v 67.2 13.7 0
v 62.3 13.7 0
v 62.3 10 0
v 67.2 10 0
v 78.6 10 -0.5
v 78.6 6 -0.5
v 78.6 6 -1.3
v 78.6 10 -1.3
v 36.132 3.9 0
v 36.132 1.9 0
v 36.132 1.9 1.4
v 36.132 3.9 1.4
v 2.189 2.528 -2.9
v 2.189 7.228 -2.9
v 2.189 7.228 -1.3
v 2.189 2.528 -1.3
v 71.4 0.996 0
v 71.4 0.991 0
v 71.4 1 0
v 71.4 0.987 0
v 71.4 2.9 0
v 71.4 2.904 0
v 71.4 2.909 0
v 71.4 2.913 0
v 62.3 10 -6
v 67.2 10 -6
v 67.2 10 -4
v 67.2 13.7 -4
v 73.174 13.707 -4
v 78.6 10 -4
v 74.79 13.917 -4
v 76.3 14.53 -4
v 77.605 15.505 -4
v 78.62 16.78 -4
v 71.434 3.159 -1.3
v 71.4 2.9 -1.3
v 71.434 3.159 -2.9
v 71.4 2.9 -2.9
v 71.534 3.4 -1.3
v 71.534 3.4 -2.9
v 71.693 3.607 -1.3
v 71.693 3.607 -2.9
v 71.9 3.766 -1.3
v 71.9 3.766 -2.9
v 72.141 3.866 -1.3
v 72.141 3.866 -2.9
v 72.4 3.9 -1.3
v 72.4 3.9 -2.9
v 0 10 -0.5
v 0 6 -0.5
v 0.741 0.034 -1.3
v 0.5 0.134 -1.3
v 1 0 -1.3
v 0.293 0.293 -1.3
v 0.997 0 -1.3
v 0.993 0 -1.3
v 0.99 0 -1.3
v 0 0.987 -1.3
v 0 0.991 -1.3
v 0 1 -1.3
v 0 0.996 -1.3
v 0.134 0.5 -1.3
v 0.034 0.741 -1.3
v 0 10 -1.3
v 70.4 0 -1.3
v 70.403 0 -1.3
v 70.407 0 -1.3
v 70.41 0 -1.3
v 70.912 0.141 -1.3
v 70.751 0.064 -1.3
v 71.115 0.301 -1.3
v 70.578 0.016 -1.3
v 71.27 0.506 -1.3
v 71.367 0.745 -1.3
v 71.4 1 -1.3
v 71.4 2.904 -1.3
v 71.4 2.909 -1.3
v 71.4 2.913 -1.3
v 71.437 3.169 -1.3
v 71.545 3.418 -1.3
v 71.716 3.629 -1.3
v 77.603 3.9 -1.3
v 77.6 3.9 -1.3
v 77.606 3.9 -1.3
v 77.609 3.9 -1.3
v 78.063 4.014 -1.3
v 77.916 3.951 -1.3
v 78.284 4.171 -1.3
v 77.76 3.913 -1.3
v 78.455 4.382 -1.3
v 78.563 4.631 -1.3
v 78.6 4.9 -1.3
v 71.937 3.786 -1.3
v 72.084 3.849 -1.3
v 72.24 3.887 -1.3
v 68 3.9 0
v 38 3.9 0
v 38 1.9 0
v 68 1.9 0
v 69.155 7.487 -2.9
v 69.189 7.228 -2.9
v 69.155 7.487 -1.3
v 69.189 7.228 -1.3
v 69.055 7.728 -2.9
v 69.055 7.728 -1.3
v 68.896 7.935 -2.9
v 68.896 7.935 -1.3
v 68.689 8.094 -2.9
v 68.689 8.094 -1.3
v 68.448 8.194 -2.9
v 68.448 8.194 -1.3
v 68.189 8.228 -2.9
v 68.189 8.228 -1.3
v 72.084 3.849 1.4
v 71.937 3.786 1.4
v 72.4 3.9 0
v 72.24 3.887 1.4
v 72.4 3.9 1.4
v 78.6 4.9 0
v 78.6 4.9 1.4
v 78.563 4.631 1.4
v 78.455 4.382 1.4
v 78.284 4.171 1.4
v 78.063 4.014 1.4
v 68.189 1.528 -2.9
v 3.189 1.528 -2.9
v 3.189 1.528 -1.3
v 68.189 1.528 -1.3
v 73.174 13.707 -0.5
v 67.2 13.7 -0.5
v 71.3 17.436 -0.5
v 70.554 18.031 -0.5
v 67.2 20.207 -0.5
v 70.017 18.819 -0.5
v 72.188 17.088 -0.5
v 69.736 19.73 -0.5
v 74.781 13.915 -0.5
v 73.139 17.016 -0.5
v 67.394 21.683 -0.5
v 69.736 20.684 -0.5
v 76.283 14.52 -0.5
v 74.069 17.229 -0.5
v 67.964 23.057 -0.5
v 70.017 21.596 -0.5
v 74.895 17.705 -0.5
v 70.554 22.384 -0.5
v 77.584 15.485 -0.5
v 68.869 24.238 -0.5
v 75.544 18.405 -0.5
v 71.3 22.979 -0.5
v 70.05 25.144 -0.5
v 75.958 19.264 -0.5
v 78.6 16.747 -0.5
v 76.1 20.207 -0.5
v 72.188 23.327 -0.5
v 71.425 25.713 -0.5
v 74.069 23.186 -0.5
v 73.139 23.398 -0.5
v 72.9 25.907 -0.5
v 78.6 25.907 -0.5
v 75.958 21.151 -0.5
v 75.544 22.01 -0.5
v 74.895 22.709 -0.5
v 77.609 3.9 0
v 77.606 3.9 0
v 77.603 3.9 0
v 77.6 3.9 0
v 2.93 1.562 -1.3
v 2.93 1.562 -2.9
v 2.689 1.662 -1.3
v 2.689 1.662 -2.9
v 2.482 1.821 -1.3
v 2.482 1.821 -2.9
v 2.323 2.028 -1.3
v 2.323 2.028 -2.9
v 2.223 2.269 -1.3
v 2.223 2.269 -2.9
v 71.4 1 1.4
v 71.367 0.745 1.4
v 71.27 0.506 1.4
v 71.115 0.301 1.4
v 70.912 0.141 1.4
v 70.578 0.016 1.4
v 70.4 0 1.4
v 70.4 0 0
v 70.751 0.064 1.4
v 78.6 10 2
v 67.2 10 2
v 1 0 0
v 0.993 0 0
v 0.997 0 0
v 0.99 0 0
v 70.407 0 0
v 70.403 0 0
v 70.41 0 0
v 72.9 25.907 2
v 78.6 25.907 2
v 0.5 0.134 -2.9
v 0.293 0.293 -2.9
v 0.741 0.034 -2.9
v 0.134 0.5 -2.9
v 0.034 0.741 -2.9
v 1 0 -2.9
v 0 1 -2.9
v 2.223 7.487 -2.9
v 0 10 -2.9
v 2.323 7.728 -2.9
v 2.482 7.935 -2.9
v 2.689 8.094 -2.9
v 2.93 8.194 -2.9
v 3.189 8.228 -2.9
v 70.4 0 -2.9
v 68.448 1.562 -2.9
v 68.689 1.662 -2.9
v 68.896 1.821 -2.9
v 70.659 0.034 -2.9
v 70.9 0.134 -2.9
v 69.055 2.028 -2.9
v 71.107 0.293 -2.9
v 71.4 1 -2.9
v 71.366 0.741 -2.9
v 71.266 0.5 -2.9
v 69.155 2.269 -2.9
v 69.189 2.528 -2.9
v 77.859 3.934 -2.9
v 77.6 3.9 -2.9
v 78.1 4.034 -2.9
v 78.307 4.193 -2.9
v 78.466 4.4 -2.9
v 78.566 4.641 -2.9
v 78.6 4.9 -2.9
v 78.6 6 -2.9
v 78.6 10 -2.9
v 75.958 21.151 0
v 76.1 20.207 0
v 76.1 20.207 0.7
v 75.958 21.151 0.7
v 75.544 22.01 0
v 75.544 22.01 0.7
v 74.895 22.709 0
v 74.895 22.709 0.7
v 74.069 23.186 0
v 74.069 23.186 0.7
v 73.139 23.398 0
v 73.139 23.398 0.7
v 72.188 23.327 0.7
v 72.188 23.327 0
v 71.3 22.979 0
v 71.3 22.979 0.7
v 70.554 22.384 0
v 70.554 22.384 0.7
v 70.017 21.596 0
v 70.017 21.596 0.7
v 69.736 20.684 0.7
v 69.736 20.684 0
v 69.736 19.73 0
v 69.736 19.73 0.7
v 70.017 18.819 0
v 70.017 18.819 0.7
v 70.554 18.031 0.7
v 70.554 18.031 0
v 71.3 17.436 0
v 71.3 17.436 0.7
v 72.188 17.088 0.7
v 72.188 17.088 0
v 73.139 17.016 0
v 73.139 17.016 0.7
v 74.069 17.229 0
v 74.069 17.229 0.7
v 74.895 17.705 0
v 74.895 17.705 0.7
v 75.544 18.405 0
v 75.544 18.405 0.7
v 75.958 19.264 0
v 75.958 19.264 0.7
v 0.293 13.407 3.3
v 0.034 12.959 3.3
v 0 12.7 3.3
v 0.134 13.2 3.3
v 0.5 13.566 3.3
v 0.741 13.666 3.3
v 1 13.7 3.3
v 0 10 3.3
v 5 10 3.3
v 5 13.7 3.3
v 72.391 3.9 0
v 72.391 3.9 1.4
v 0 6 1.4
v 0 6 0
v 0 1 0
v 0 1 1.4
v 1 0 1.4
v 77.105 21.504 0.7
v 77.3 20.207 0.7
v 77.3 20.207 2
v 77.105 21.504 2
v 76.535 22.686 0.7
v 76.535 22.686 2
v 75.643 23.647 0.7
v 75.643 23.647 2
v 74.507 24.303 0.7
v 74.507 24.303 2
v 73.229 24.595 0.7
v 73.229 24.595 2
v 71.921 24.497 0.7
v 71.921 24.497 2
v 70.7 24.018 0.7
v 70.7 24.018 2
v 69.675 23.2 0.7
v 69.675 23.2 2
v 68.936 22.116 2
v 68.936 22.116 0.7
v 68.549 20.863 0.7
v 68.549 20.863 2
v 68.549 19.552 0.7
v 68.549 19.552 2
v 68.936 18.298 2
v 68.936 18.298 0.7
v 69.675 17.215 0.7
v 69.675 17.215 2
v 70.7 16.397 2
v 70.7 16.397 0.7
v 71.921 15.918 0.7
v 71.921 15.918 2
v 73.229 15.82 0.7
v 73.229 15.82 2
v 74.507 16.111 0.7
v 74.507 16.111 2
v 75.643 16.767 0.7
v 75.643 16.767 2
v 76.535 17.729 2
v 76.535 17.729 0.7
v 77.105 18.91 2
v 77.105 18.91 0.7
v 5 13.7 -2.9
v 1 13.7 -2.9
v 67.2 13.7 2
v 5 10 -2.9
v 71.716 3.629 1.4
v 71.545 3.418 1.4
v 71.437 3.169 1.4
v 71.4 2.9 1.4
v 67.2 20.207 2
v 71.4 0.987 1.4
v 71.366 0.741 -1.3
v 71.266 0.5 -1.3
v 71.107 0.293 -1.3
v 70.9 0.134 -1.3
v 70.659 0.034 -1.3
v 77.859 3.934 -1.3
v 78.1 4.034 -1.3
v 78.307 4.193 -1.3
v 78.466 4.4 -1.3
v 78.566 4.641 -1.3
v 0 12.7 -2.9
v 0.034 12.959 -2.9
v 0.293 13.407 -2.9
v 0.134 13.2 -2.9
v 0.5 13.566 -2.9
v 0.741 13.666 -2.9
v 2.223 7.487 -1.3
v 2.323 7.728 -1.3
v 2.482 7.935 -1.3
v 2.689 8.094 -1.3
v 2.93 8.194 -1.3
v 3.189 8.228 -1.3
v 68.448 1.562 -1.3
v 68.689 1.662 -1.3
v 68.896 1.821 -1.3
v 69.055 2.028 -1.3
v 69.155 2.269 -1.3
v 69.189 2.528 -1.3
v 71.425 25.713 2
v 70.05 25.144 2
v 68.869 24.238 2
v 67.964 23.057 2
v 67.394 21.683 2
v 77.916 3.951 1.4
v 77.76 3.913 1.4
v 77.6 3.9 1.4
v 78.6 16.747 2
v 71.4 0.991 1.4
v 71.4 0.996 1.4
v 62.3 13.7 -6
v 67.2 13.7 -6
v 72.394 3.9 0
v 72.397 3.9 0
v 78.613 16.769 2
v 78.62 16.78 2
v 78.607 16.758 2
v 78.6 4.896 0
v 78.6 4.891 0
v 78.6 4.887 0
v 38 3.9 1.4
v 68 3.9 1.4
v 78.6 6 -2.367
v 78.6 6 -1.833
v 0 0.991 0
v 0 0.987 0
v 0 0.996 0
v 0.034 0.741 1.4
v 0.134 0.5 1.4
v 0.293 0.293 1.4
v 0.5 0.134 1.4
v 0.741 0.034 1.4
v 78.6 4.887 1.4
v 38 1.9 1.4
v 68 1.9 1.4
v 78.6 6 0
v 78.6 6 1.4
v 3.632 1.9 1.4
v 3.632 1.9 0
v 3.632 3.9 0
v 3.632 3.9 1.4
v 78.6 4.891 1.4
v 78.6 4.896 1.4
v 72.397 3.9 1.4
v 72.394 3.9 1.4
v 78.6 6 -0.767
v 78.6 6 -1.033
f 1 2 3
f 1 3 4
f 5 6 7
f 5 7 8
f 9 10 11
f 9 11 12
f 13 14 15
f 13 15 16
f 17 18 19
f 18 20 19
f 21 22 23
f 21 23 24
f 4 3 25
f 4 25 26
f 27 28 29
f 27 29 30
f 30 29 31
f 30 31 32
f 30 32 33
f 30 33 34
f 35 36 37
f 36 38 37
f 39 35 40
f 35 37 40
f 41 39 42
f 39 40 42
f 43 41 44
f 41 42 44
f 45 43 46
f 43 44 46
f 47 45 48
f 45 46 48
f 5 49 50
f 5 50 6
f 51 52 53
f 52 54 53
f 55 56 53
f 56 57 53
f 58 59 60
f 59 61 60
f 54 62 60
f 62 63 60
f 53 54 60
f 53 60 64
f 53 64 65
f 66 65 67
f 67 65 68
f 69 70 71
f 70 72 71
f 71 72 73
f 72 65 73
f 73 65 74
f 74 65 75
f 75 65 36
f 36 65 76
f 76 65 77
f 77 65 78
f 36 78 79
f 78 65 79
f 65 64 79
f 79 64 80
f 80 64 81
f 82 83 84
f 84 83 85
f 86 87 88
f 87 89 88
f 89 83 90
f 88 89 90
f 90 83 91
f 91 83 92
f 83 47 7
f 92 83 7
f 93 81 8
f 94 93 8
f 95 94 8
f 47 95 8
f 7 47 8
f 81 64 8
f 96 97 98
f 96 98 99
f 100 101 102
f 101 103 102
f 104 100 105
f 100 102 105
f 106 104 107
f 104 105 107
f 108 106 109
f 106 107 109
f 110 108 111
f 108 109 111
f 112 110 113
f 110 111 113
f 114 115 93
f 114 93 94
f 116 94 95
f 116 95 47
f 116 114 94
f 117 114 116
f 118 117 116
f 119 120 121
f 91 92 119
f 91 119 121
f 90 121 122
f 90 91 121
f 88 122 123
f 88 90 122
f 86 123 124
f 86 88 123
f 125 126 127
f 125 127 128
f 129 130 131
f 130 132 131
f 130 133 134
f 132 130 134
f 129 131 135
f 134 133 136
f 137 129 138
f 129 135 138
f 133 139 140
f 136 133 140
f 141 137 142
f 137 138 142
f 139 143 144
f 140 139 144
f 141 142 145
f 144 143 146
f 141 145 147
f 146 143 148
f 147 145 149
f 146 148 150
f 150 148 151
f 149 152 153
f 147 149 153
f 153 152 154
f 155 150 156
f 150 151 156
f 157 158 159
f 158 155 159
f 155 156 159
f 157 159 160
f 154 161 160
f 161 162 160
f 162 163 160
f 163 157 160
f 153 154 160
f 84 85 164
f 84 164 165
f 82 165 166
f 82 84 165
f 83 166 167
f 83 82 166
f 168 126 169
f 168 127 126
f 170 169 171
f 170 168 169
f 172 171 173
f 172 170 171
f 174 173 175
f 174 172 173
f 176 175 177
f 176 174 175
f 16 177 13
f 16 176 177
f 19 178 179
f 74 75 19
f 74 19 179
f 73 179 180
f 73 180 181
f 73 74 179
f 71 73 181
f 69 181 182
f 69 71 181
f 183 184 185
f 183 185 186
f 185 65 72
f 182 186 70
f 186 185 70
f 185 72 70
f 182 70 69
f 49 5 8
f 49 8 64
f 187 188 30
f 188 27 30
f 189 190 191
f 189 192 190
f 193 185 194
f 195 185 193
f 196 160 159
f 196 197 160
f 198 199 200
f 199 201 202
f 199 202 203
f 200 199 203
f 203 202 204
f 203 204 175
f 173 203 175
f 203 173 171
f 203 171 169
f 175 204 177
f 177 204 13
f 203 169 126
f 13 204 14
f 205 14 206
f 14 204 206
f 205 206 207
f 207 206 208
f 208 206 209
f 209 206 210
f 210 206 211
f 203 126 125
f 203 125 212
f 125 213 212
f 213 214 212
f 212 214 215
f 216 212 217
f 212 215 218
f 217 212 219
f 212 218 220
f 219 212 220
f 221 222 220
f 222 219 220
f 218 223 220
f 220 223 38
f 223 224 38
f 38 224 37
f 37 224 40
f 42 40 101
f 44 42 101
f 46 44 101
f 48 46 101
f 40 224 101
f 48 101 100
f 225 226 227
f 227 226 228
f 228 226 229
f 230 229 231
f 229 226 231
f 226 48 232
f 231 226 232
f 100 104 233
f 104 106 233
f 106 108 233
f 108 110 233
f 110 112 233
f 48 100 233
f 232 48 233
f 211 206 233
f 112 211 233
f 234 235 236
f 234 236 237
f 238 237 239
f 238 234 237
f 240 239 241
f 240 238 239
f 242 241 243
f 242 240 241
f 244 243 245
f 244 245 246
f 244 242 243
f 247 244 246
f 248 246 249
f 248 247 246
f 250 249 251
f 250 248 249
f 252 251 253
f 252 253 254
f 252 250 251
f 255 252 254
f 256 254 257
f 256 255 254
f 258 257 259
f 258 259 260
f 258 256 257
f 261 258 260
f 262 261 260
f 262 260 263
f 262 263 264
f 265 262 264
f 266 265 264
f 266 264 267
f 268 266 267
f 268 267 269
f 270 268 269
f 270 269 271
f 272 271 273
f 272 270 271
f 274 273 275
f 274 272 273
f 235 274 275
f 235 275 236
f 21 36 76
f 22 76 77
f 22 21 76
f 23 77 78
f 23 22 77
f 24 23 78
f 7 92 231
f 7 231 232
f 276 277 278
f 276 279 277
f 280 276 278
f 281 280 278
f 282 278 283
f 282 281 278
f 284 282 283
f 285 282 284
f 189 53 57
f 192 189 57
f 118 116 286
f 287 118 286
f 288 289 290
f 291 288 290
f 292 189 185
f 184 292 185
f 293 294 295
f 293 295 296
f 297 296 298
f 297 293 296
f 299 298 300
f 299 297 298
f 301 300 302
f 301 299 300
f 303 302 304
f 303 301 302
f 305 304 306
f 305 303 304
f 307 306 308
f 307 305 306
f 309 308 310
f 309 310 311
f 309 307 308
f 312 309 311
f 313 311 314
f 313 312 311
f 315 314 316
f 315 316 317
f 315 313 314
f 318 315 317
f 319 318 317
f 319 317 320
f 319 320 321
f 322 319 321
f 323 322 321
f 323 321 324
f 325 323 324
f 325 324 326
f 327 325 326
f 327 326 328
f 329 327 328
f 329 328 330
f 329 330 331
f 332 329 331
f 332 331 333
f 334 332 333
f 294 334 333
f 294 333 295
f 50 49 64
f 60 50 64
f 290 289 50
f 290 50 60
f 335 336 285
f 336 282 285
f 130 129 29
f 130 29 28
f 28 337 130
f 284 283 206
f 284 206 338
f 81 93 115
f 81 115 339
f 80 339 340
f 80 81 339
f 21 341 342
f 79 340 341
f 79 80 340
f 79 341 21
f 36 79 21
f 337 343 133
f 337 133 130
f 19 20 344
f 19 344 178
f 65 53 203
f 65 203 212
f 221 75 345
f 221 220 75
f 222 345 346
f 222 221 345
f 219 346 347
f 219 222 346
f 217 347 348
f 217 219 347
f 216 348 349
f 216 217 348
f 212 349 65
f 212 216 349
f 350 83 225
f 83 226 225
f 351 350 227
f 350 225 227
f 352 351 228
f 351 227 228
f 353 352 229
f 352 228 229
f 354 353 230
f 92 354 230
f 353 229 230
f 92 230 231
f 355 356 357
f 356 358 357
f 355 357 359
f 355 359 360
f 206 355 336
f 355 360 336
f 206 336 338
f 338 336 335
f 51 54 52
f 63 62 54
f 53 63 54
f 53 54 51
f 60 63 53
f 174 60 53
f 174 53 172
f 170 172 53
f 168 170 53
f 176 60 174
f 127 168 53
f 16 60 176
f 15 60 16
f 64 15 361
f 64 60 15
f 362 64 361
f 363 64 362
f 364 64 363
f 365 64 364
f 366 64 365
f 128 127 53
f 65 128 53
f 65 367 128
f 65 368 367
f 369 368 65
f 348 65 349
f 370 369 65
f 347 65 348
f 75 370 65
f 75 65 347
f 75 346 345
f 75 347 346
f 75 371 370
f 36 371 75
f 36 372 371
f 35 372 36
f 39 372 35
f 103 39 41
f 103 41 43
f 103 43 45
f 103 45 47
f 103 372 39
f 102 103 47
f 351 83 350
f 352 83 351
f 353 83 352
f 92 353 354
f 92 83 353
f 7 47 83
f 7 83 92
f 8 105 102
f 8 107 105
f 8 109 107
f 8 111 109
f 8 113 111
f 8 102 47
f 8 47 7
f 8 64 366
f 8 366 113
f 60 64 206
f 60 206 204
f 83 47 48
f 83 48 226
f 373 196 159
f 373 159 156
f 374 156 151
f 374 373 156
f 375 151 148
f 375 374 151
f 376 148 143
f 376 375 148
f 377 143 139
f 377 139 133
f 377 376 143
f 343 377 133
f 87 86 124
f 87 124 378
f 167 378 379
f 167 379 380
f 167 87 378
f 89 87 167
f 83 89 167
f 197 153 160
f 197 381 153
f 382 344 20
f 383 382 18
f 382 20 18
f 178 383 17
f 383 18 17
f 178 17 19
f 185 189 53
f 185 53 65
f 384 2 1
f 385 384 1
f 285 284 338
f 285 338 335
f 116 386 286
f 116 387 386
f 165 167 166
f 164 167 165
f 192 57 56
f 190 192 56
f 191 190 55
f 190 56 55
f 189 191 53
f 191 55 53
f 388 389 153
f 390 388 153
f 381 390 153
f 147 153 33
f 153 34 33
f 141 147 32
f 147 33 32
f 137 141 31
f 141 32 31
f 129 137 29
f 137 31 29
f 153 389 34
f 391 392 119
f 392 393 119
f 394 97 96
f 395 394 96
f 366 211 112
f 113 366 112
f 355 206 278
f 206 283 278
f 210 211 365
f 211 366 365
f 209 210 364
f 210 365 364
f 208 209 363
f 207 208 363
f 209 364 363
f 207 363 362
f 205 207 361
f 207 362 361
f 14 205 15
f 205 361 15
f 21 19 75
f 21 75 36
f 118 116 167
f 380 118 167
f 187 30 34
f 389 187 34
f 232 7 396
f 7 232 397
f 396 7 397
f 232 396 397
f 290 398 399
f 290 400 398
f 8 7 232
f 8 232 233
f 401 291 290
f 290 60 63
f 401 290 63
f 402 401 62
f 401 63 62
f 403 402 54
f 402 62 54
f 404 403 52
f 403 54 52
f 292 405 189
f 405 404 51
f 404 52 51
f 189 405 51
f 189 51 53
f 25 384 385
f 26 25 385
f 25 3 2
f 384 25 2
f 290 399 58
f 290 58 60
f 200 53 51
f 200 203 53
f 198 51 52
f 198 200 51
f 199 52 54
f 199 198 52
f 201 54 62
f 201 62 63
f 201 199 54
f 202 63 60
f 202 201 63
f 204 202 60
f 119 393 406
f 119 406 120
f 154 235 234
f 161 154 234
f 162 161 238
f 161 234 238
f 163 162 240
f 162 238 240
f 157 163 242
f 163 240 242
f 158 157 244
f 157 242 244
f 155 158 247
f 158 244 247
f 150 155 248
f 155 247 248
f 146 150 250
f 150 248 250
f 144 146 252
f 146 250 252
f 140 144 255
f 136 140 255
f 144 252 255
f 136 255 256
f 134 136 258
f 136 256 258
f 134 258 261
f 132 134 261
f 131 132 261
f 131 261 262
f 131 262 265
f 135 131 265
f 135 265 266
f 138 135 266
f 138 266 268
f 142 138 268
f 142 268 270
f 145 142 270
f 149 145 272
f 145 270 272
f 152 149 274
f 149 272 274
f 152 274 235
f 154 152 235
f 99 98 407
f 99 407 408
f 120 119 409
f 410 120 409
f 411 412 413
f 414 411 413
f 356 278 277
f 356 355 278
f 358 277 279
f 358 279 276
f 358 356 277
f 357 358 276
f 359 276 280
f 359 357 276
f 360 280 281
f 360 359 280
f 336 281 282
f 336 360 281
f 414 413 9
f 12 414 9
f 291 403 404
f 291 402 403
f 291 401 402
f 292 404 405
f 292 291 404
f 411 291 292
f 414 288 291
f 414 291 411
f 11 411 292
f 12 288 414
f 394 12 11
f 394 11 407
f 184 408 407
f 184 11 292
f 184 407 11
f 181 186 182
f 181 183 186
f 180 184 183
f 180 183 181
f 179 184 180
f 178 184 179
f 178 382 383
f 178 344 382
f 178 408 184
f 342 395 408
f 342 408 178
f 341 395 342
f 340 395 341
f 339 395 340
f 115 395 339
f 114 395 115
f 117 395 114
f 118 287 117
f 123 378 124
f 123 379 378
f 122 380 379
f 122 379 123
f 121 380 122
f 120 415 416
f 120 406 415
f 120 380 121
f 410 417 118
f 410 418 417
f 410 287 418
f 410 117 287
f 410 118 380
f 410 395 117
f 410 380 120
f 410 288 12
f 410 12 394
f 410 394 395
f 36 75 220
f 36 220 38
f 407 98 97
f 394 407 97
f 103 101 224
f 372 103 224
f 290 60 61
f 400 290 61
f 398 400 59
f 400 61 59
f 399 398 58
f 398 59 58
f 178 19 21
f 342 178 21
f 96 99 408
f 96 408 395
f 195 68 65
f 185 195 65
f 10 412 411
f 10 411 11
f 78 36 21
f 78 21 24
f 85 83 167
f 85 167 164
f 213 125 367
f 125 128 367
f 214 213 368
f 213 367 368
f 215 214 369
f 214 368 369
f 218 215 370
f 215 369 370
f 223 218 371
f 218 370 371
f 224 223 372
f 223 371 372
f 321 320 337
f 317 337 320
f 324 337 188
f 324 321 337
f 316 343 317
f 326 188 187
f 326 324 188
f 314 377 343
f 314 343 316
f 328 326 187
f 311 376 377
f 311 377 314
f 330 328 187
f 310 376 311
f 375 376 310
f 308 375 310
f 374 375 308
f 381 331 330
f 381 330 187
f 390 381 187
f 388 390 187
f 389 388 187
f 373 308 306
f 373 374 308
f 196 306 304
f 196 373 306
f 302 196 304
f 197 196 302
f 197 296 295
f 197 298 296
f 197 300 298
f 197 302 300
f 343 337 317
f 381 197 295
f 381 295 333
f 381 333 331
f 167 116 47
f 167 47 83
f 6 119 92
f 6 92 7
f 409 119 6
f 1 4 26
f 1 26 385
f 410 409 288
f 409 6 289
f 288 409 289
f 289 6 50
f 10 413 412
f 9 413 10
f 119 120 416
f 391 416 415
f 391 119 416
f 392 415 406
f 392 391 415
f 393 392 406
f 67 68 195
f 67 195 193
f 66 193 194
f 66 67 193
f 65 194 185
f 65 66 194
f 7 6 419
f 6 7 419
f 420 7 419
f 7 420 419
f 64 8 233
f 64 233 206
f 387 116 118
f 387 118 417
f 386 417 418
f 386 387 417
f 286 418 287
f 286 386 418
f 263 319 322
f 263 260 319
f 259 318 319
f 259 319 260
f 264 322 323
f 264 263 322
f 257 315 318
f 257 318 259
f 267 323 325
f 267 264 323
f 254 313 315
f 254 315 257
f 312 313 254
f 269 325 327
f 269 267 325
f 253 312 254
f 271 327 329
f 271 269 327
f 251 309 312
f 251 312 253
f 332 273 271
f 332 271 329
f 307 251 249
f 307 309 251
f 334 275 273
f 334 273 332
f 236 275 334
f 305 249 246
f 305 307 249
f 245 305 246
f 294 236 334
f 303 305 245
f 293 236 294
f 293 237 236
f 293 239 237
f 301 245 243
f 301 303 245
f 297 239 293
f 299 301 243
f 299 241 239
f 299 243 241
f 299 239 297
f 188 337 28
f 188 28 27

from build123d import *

# Parameters (mm, degrees)
F0_W           = 32.5
F0_H           = 2
F0_W_2         = 30
F1_DEPTH       = 1.4
F3_DEPTH       = 1.3
F4_DEPTH       = 1.6
F5_W           = 67
F5_H           = 6.7
F6_DEPTH       = 4.301
F9_T4_DEPTH    = 3.9
F9_T9_DEPTH    = 3.8
F9_T11_DEPTH   = 6.3
F9_T13_DEPTH   = 6.4
F9_2_F1_R      = 1
F9_2_F2_R      = 1
F11_DEPTH      = 4
F12_R          = 4.4
F13_DEPTH      = 2
F12_R_2        = 3.2
F14_DEPTH      = 0.7
F15_DEPTH      = 0.5
F7_W           = 5
F7_H           = 3.7
F16_DEPTH      = 3.3
F16_DEPTH_BACK = 2.9
F8_W           = 4.9
F8_H           = 3.7
F17_DEPTH      = 6
F19_DEPTH      = 0.5
F20_R          = 1


# Not quite as in the source:
# - a fillet or chamfer that OpenCascade refuses, or shapes differently, is made with other operations: its cross-section is extruded or revolved along the edge and cut away or added
# - ends of sketch curves that miss each other by under 0.0002 mm in the source are joined


with BuildPart() as f1:
    # F0 (on Top) → F1 (new body)
    with BuildSketch(Plane.XY):
        Polygon((78.6000193149, 6.0000242492), (1.93149e-05, 6.0000242492), (1.93149e-05, 2.42492e-05), (71.4000193149, 2.42492e-05), (71.4000193149, 3.9000242492), (78.6000193149, 3.9000242492), align=None)
        with Locations((19.8820251949, 2.9000242492)):
            Rectangle(F0_W, F0_H, mode=Mode.SUBTRACT)
        with Locations((52.9996412504, 2.9000242492)):
            Rectangle(F0_W_2, F0_H, mode=Mode.SUBTRACT)
    extrude(amount=F1_DEPTH)

    # F2 (on Top) → F3 (join)
    with BuildSketch(Plane.XY):
        with BuildLine():
            Line((-6.4456e-05, 6.0000242492), (-6.4456e-05, -2.57419e-05))
            Line((-6.4456e-05, -2.57419e-05), (71.399935544, -2.57419e-05))
            Line((71.399935544, -2.57419e-05), (71.399935544, 3.8999804767))
            Line((71.399935544, 3.8999804767), (78.599935544, 3.8999804767))
            Line((78.599935544, 3.8999804767), (78.599935544, 6.0000242492))
            add(Edge.make_bspline(
                [(78.599935544, 6.0000242492), (52.4000193149, 6.0000242492), (26.2000193149, 6.0000242492), (-6.4456e-05, 6.0000242492)],
                knots=[0, 0, 0, 0, 1, 1, 1, 1], degree=3))
        make_face()
        with BuildLine():
            Line((-6.4456e-05, 9.9999804767), (-6.4456e-05, 6.0000242492))
            add(Edge.make_bspline(
                [(78.6000193149, 6.0000242492), (52.4000193149, 6.0000242492), (26.2000193149, 6.0000242492), (-6.4456e-05, 6.0000242492)],
                knots=[0, 0, 0, 0, 1, 1, 1, 1], degree=3))
            Line((78.6000193149, 6.0000242492), (78.599935544, 9.9999804767))
            Line((78.599935544, 9.9999804767), (-6.4456e-05, 9.9999804767))
        make_face()
    extrude(amount=-F3_DEPTH)


with BuildPart() as f4:
    # F4 (new): a face of the model
    f4_faces = [f1.part.faces().sort_by_distance(p)[0] for p in [
        (37.9773022777, 5.1129767056, -1.3),
    ]]
    extrude(f4_faces, amount=F4_DEPTH)

    # F5 (on face) → F6 (cut, through all)
    with BuildSketch(Plane(origin=(0, 0, -2.9), x_dir=(1, 0, 0), z_dir=(0, 0, -1))):
        with Locations((35.6888609044, -4.8779113121)):
            Rectangle(F5_W, F5_H)
    extrude(amount=-F6_DEPTH, mode=Mode.SUBTRACT)

    # F9#2: fillet of radius 1 on 8 edges, made by hand

    # F9_2_f1
    f9_2_f1_edges = [f4.edges().sort_by_distance(p)[0] for p in [
        (71.399935544, 3.8999804767, -2.1),
        (69.1888609044, 8.2279113121, -2.1),
        (69.1888609044, 1.5279113121, -2.1),
        (2.1888609044, 8.2279113121, -2.1),
        (2.1888609044, 1.5279113121, -2.1),
    ]]
    fillet(f9_2_f1_edges, radius=F9_2_F1_R)

    # F9_2_f2
    f9_2_f2_edges = [f4.edges().sort_by_distance(p)[0] for p in [
        (71.399935544, -2.57419e-05, -2.1),
        (78.599935544, 3.8999804767, -2.1),
        (-6.4456e-05, -2.57419e-05, -2.1),
    ]]
    fillet(f9_2_f2_edges, radius=F9_2_F2_R)


with BuildPart() as f1_1:
    add(f1.part)

    # F9: fillet of radius 1 on 8 edges, made by hand


with BuildPart() as f9_tool2:
    # F9_s3 → F9_t4 (new body)
    with BuildSketch(Plane.XY.offset(-2.5)):
        with BuildLine():
            ThreePointArc((72.4000193149, 3.9000242492), (71.6929125337, 3.6071310304), (71.4000193149, 2.9000242492))
            Line((71.4000193149, 2.9000242492), (71.4000193149, 3.9000242492))
            Line((71.4000193149, 3.9000242492), (72.4000193149, 3.9000242492))
        make_face()
    extrude(amount=F9_T4_DEPTH)

    split(bisect_by=Plane.XY.offset(-1.3), keep=Keep.TOP)


with BuildPart() as f1_2:
    add(f1_1.part)

    # F9_t1: union F9_tool2
    add(f9_tool2.part)


with BuildPart() as f9_tool7:
    # F9_s8 → F9_t9 (new body)
    with BuildSketch(Plane.XY.offset(2.5)):
        with BuildLine():
            ThreePointArc((71.399935544, 2.8999804767), (71.6928287629, 3.6070872579), (72.399935544, 3.8999804767))
            Line((72.399935544, 3.8999804767), (71.399935544, 3.8999804767))
            Line((71.399935544, 3.8999804767), (71.399935544, 2.8999804767))
        make_face()
    extrude(amount=-F9_T9_DEPTH)

    split(bisect_by=Plane.XY.offset(1.4), keep=Keep.BOTTOM)


with BuildPart() as f1_3:
    add(f1_2.part)

    # F9_t6: union F9_tool7
    add(f9_tool7.part)

    # F9_s12 → F9_t11 (cut)
    with BuildSketch(Plane.XY.offset(-3.8)):
        with BuildLine():
            ThreePointArc((71.399935544, 0.9999742581), (71.1070423252, 0.292867477), (70.399935544, -2.57419e-05))
            Line((70.399935544, -2.57419e-05), (71.399935544, -2.57419e-05))
            Line((71.399935544, -2.57419e-05), (71.399935544, 0.9999742581))
        make_face()
        with BuildLine():
            ThreePointArc((78.599935544, 4.8999804767), (78.3070423252, 4.1928736955), (77.599935544, 3.8999804767))
            Line((77.599935544, 3.8999804767), (78.599935544, 3.8999804767))
            Line((78.599935544, 3.8999804767), (78.599935544, 4.8999804767))
        make_face()
        with BuildLine():
            ThreePointArc((-6.4456e-05, 0.9999742581), (0.2928287629, 0.292867477), (0.999935544, -2.57419e-05))
            Line((0.999935544, -2.57419e-05), (-6.4456e-05, -2.57419e-05))
            Line((-6.4456e-05, -2.57419e-05), (-6.4456e-05, 0.9999742581))
        make_face()
    extrude(amount=F9_T11_DEPTH, mode=Mode.SUBTRACT)

    # F9_s14 → F9_t13 (cut)
    with BuildSketch(Plane.XY.offset(-2.5)):
        with BuildLine():
            ThreePointArc((70.4000193149, 2.42492e-05), (71.1071260961, 0.292917468), (71.4000193149, 1.0000242492))
            Line((71.4000193149, 1.0000242492), (71.4000193149, 2.42492e-05))
            Line((71.4000193149, 2.42492e-05), (70.4000193149, 2.42492e-05))
        make_face()
        with BuildLine():
            ThreePointArc((78.6000193149, 4.9000242492), (78.3071260961, 4.192917468), (77.6000193149, 3.9000242492))
            Line((77.6000193149, 3.9000242492), (78.6000193149, 3.9000242492))
            Line((78.6000193149, 3.9000242492), (78.6000193149, 4.9000242492))
        make_face()
        with BuildLine():
            ThreePointArc((1.93149e-05, 1.0000242492), (0.2929125337, 0.292917468), (1.0000193149, 2.42492e-05))
            Line((1.0000193149, 2.42492e-05), (1.93149e-05, 2.42492e-05))
            Line((1.93149e-05, 2.42492e-05), (1.93149e-05, 1.0000242492))
        make_face()
    extrude(amount=F9_T13_DEPTH, mode=Mode.SUBTRACT)

    # F18 (on face) → F19 (cut)
    with BuildSketch(Plane.XY):
        with BuildLine():
            Line((78.599935544, 9.9999804767), (-6.4456e-05, 9.9999804767))
            Line((-6.4456e-05, 9.9999804767), (-6.4456e-05, 6.0000242492))
            add(Edge.make_bspline(
                [(-6.4456e-05, 6.0000242492), (26.2000193149, 6.0000242492), (52.4000193149, 6.0000242492), (78.6000193149, 6.0000242492)],
                knots=[0, 0, 0, 0, 1, 1, 1, 1], degree=3))
            Line((78.6000193149, 6.0000242492), (78.599935544, 9.9999804767))
        make_face()
    extrude(amount=-F19_DEPTH, mode=Mode.SUBTRACT)


with BuildPart() as f11:
    # F10 (on Top) → F11 (new body)
    with BuildSketch(Plane.XY):
        with BuildLine():
            Line((78.599935544, 9.9999804767), (78.6198350713, 16.7795400161))
            ThreePointArc((78.6198350713, 16.7795400161), (76.299661596, 14.5297660466), (73.1743396044, 13.7069353726))
            Line((73.1743396044, 13.7069353726), (67.1999678016, 13.7000184029))
            Line((67.1999678016, 13.7000184029), (67.1999678016, 10.0000184029))
            Line((67.1999678016, 10.0000184029), (78.599935544, 9.9999804767))
        make_face()
    extrude(amount=-F11_DEPTH)

    # F12 (on Top) + F10 (on Top) → F13 (join)
    with BuildSketch(Plane.XY):
        with BuildLine():
            Line((78.5999745131, 25.9072966889), (72.8999745131, 25.9072966889))
            ThreePointArc((72.8999745131, 25.9072966889), (68.8694658603, 24.2378053416), (67.1999745131, 20.2072966889))
            Line((67.1999745131, 20.2072966889), (67.1999745131, 13.7000184029))
            Line((67.1999745131, 13.7000184029), (73.1743396044, 13.7069353726))
            ThreePointArc((73.1743396044, 13.7069353726), (76.2830339187, 14.5204167001), (78.5999745131, 16.7469652605))
            Line((78.5999745131, 16.7469652605), (78.5999745131, 25.9072966889))
        make_face()
        with Locations((72.8999819636, 20.2072966889)):
            Circle(F12_R, mode=Mode.SUBTRACT)
    with BuildSketch(Plane.XY):
        with BuildLine():
            Line((78.599935544, 9.9999804767), (78.6198350713, 16.7795400161))
            ThreePointArc((78.6198350713, 16.7795400161), (76.299661596, 14.5297660466), (73.1743396044, 13.7069353726))
            Line((73.1743396044, 13.7069353726), (67.1999678016, 13.7000184029))
            Line((67.1999678016, 13.7000184029), (67.1999678016, 10.0000184029))
            Line((67.1999678016, 10.0000184029), (78.599935544, 9.9999804767))
        make_face()
    extrude(amount=F13_DEPTH)

    # F12 (on Top) → F14 (join)
    with BuildSketch(Plane.XY):
        with Locations((72.8999819636, 20.2072966889)):
            Circle(F12_R)
        with Locations((72.8999819636, 20.2072966889)):
            Circle(F12_R_2, mode=Mode.SUBTRACT)
    extrude(amount=F14_DEPTH)

    # F12 (on Top) → F15 (join)
    with BuildSketch(Plane.XY):
        with BuildLine():
            Line((78.5999745131, 25.9072966889), (72.8999745131, 25.9072966889))
            ThreePointArc((72.8999745131, 25.9072966889), (68.8694658603, 24.2378053416), (67.1999745131, 20.2072966889))
            Line((67.1999745131, 20.2072966889), (67.1999745131, 13.7000184029))
            Line((67.1999745131, 13.7000184029), (73.1743396044, 13.7069353726))
            ThreePointArc((73.1743396044, 13.7069353726), (76.2830339187, 14.5204167001), (78.5999745131, 16.7469652605))
            Line((78.5999745131, 16.7469652605), (78.5999745131, 25.9072966889))
        make_face()
        with Locations((72.8999819636, 20.2072966889)):
            Circle(F12_R, mode=Mode.SUBTRACT)
        with Locations((72.8999819636, 20.2072966889)):
            Circle(F12_R)
        with Locations((72.8999819636, 20.2072966889)):
            Circle(F12_R_2, mode=Mode.SUBTRACT)
    extrude(amount=-F15_DEPTH)


with BuildPart() as f16:
    # F7 (on Top) → F16 (new body, two sides)
    with BuildSketch(Plane.XY) as f16_sk:
        with Locations((2.5, 11.8499671802)):
            Rectangle(F7_W, F7_H)
    extrude(amount=F16_DEPTH)
    extrude(f16_sk.sketch, amount=-F16_DEPTH_BACK)

    # F20
    f20_edges = [f16.edges().sort_by_distance(p)[0] for p in [
        (0, 13.699967, 0.2),
    ]]
    fillet(f20_edges, radius=F20_R)


with BuildPart() as f17:
    # F8 (on face) → F17 (new body)
    with BuildSketch(Plane.XY):
        with Locations((64.7499678016, 11.8500184029)):
            Rectangle(F8_W, F8_H)
    extrude(amount=-F17_DEPTH)


solid = Compound([f4.part, f1_3.part, f11.part, f16.part, f17.part])
